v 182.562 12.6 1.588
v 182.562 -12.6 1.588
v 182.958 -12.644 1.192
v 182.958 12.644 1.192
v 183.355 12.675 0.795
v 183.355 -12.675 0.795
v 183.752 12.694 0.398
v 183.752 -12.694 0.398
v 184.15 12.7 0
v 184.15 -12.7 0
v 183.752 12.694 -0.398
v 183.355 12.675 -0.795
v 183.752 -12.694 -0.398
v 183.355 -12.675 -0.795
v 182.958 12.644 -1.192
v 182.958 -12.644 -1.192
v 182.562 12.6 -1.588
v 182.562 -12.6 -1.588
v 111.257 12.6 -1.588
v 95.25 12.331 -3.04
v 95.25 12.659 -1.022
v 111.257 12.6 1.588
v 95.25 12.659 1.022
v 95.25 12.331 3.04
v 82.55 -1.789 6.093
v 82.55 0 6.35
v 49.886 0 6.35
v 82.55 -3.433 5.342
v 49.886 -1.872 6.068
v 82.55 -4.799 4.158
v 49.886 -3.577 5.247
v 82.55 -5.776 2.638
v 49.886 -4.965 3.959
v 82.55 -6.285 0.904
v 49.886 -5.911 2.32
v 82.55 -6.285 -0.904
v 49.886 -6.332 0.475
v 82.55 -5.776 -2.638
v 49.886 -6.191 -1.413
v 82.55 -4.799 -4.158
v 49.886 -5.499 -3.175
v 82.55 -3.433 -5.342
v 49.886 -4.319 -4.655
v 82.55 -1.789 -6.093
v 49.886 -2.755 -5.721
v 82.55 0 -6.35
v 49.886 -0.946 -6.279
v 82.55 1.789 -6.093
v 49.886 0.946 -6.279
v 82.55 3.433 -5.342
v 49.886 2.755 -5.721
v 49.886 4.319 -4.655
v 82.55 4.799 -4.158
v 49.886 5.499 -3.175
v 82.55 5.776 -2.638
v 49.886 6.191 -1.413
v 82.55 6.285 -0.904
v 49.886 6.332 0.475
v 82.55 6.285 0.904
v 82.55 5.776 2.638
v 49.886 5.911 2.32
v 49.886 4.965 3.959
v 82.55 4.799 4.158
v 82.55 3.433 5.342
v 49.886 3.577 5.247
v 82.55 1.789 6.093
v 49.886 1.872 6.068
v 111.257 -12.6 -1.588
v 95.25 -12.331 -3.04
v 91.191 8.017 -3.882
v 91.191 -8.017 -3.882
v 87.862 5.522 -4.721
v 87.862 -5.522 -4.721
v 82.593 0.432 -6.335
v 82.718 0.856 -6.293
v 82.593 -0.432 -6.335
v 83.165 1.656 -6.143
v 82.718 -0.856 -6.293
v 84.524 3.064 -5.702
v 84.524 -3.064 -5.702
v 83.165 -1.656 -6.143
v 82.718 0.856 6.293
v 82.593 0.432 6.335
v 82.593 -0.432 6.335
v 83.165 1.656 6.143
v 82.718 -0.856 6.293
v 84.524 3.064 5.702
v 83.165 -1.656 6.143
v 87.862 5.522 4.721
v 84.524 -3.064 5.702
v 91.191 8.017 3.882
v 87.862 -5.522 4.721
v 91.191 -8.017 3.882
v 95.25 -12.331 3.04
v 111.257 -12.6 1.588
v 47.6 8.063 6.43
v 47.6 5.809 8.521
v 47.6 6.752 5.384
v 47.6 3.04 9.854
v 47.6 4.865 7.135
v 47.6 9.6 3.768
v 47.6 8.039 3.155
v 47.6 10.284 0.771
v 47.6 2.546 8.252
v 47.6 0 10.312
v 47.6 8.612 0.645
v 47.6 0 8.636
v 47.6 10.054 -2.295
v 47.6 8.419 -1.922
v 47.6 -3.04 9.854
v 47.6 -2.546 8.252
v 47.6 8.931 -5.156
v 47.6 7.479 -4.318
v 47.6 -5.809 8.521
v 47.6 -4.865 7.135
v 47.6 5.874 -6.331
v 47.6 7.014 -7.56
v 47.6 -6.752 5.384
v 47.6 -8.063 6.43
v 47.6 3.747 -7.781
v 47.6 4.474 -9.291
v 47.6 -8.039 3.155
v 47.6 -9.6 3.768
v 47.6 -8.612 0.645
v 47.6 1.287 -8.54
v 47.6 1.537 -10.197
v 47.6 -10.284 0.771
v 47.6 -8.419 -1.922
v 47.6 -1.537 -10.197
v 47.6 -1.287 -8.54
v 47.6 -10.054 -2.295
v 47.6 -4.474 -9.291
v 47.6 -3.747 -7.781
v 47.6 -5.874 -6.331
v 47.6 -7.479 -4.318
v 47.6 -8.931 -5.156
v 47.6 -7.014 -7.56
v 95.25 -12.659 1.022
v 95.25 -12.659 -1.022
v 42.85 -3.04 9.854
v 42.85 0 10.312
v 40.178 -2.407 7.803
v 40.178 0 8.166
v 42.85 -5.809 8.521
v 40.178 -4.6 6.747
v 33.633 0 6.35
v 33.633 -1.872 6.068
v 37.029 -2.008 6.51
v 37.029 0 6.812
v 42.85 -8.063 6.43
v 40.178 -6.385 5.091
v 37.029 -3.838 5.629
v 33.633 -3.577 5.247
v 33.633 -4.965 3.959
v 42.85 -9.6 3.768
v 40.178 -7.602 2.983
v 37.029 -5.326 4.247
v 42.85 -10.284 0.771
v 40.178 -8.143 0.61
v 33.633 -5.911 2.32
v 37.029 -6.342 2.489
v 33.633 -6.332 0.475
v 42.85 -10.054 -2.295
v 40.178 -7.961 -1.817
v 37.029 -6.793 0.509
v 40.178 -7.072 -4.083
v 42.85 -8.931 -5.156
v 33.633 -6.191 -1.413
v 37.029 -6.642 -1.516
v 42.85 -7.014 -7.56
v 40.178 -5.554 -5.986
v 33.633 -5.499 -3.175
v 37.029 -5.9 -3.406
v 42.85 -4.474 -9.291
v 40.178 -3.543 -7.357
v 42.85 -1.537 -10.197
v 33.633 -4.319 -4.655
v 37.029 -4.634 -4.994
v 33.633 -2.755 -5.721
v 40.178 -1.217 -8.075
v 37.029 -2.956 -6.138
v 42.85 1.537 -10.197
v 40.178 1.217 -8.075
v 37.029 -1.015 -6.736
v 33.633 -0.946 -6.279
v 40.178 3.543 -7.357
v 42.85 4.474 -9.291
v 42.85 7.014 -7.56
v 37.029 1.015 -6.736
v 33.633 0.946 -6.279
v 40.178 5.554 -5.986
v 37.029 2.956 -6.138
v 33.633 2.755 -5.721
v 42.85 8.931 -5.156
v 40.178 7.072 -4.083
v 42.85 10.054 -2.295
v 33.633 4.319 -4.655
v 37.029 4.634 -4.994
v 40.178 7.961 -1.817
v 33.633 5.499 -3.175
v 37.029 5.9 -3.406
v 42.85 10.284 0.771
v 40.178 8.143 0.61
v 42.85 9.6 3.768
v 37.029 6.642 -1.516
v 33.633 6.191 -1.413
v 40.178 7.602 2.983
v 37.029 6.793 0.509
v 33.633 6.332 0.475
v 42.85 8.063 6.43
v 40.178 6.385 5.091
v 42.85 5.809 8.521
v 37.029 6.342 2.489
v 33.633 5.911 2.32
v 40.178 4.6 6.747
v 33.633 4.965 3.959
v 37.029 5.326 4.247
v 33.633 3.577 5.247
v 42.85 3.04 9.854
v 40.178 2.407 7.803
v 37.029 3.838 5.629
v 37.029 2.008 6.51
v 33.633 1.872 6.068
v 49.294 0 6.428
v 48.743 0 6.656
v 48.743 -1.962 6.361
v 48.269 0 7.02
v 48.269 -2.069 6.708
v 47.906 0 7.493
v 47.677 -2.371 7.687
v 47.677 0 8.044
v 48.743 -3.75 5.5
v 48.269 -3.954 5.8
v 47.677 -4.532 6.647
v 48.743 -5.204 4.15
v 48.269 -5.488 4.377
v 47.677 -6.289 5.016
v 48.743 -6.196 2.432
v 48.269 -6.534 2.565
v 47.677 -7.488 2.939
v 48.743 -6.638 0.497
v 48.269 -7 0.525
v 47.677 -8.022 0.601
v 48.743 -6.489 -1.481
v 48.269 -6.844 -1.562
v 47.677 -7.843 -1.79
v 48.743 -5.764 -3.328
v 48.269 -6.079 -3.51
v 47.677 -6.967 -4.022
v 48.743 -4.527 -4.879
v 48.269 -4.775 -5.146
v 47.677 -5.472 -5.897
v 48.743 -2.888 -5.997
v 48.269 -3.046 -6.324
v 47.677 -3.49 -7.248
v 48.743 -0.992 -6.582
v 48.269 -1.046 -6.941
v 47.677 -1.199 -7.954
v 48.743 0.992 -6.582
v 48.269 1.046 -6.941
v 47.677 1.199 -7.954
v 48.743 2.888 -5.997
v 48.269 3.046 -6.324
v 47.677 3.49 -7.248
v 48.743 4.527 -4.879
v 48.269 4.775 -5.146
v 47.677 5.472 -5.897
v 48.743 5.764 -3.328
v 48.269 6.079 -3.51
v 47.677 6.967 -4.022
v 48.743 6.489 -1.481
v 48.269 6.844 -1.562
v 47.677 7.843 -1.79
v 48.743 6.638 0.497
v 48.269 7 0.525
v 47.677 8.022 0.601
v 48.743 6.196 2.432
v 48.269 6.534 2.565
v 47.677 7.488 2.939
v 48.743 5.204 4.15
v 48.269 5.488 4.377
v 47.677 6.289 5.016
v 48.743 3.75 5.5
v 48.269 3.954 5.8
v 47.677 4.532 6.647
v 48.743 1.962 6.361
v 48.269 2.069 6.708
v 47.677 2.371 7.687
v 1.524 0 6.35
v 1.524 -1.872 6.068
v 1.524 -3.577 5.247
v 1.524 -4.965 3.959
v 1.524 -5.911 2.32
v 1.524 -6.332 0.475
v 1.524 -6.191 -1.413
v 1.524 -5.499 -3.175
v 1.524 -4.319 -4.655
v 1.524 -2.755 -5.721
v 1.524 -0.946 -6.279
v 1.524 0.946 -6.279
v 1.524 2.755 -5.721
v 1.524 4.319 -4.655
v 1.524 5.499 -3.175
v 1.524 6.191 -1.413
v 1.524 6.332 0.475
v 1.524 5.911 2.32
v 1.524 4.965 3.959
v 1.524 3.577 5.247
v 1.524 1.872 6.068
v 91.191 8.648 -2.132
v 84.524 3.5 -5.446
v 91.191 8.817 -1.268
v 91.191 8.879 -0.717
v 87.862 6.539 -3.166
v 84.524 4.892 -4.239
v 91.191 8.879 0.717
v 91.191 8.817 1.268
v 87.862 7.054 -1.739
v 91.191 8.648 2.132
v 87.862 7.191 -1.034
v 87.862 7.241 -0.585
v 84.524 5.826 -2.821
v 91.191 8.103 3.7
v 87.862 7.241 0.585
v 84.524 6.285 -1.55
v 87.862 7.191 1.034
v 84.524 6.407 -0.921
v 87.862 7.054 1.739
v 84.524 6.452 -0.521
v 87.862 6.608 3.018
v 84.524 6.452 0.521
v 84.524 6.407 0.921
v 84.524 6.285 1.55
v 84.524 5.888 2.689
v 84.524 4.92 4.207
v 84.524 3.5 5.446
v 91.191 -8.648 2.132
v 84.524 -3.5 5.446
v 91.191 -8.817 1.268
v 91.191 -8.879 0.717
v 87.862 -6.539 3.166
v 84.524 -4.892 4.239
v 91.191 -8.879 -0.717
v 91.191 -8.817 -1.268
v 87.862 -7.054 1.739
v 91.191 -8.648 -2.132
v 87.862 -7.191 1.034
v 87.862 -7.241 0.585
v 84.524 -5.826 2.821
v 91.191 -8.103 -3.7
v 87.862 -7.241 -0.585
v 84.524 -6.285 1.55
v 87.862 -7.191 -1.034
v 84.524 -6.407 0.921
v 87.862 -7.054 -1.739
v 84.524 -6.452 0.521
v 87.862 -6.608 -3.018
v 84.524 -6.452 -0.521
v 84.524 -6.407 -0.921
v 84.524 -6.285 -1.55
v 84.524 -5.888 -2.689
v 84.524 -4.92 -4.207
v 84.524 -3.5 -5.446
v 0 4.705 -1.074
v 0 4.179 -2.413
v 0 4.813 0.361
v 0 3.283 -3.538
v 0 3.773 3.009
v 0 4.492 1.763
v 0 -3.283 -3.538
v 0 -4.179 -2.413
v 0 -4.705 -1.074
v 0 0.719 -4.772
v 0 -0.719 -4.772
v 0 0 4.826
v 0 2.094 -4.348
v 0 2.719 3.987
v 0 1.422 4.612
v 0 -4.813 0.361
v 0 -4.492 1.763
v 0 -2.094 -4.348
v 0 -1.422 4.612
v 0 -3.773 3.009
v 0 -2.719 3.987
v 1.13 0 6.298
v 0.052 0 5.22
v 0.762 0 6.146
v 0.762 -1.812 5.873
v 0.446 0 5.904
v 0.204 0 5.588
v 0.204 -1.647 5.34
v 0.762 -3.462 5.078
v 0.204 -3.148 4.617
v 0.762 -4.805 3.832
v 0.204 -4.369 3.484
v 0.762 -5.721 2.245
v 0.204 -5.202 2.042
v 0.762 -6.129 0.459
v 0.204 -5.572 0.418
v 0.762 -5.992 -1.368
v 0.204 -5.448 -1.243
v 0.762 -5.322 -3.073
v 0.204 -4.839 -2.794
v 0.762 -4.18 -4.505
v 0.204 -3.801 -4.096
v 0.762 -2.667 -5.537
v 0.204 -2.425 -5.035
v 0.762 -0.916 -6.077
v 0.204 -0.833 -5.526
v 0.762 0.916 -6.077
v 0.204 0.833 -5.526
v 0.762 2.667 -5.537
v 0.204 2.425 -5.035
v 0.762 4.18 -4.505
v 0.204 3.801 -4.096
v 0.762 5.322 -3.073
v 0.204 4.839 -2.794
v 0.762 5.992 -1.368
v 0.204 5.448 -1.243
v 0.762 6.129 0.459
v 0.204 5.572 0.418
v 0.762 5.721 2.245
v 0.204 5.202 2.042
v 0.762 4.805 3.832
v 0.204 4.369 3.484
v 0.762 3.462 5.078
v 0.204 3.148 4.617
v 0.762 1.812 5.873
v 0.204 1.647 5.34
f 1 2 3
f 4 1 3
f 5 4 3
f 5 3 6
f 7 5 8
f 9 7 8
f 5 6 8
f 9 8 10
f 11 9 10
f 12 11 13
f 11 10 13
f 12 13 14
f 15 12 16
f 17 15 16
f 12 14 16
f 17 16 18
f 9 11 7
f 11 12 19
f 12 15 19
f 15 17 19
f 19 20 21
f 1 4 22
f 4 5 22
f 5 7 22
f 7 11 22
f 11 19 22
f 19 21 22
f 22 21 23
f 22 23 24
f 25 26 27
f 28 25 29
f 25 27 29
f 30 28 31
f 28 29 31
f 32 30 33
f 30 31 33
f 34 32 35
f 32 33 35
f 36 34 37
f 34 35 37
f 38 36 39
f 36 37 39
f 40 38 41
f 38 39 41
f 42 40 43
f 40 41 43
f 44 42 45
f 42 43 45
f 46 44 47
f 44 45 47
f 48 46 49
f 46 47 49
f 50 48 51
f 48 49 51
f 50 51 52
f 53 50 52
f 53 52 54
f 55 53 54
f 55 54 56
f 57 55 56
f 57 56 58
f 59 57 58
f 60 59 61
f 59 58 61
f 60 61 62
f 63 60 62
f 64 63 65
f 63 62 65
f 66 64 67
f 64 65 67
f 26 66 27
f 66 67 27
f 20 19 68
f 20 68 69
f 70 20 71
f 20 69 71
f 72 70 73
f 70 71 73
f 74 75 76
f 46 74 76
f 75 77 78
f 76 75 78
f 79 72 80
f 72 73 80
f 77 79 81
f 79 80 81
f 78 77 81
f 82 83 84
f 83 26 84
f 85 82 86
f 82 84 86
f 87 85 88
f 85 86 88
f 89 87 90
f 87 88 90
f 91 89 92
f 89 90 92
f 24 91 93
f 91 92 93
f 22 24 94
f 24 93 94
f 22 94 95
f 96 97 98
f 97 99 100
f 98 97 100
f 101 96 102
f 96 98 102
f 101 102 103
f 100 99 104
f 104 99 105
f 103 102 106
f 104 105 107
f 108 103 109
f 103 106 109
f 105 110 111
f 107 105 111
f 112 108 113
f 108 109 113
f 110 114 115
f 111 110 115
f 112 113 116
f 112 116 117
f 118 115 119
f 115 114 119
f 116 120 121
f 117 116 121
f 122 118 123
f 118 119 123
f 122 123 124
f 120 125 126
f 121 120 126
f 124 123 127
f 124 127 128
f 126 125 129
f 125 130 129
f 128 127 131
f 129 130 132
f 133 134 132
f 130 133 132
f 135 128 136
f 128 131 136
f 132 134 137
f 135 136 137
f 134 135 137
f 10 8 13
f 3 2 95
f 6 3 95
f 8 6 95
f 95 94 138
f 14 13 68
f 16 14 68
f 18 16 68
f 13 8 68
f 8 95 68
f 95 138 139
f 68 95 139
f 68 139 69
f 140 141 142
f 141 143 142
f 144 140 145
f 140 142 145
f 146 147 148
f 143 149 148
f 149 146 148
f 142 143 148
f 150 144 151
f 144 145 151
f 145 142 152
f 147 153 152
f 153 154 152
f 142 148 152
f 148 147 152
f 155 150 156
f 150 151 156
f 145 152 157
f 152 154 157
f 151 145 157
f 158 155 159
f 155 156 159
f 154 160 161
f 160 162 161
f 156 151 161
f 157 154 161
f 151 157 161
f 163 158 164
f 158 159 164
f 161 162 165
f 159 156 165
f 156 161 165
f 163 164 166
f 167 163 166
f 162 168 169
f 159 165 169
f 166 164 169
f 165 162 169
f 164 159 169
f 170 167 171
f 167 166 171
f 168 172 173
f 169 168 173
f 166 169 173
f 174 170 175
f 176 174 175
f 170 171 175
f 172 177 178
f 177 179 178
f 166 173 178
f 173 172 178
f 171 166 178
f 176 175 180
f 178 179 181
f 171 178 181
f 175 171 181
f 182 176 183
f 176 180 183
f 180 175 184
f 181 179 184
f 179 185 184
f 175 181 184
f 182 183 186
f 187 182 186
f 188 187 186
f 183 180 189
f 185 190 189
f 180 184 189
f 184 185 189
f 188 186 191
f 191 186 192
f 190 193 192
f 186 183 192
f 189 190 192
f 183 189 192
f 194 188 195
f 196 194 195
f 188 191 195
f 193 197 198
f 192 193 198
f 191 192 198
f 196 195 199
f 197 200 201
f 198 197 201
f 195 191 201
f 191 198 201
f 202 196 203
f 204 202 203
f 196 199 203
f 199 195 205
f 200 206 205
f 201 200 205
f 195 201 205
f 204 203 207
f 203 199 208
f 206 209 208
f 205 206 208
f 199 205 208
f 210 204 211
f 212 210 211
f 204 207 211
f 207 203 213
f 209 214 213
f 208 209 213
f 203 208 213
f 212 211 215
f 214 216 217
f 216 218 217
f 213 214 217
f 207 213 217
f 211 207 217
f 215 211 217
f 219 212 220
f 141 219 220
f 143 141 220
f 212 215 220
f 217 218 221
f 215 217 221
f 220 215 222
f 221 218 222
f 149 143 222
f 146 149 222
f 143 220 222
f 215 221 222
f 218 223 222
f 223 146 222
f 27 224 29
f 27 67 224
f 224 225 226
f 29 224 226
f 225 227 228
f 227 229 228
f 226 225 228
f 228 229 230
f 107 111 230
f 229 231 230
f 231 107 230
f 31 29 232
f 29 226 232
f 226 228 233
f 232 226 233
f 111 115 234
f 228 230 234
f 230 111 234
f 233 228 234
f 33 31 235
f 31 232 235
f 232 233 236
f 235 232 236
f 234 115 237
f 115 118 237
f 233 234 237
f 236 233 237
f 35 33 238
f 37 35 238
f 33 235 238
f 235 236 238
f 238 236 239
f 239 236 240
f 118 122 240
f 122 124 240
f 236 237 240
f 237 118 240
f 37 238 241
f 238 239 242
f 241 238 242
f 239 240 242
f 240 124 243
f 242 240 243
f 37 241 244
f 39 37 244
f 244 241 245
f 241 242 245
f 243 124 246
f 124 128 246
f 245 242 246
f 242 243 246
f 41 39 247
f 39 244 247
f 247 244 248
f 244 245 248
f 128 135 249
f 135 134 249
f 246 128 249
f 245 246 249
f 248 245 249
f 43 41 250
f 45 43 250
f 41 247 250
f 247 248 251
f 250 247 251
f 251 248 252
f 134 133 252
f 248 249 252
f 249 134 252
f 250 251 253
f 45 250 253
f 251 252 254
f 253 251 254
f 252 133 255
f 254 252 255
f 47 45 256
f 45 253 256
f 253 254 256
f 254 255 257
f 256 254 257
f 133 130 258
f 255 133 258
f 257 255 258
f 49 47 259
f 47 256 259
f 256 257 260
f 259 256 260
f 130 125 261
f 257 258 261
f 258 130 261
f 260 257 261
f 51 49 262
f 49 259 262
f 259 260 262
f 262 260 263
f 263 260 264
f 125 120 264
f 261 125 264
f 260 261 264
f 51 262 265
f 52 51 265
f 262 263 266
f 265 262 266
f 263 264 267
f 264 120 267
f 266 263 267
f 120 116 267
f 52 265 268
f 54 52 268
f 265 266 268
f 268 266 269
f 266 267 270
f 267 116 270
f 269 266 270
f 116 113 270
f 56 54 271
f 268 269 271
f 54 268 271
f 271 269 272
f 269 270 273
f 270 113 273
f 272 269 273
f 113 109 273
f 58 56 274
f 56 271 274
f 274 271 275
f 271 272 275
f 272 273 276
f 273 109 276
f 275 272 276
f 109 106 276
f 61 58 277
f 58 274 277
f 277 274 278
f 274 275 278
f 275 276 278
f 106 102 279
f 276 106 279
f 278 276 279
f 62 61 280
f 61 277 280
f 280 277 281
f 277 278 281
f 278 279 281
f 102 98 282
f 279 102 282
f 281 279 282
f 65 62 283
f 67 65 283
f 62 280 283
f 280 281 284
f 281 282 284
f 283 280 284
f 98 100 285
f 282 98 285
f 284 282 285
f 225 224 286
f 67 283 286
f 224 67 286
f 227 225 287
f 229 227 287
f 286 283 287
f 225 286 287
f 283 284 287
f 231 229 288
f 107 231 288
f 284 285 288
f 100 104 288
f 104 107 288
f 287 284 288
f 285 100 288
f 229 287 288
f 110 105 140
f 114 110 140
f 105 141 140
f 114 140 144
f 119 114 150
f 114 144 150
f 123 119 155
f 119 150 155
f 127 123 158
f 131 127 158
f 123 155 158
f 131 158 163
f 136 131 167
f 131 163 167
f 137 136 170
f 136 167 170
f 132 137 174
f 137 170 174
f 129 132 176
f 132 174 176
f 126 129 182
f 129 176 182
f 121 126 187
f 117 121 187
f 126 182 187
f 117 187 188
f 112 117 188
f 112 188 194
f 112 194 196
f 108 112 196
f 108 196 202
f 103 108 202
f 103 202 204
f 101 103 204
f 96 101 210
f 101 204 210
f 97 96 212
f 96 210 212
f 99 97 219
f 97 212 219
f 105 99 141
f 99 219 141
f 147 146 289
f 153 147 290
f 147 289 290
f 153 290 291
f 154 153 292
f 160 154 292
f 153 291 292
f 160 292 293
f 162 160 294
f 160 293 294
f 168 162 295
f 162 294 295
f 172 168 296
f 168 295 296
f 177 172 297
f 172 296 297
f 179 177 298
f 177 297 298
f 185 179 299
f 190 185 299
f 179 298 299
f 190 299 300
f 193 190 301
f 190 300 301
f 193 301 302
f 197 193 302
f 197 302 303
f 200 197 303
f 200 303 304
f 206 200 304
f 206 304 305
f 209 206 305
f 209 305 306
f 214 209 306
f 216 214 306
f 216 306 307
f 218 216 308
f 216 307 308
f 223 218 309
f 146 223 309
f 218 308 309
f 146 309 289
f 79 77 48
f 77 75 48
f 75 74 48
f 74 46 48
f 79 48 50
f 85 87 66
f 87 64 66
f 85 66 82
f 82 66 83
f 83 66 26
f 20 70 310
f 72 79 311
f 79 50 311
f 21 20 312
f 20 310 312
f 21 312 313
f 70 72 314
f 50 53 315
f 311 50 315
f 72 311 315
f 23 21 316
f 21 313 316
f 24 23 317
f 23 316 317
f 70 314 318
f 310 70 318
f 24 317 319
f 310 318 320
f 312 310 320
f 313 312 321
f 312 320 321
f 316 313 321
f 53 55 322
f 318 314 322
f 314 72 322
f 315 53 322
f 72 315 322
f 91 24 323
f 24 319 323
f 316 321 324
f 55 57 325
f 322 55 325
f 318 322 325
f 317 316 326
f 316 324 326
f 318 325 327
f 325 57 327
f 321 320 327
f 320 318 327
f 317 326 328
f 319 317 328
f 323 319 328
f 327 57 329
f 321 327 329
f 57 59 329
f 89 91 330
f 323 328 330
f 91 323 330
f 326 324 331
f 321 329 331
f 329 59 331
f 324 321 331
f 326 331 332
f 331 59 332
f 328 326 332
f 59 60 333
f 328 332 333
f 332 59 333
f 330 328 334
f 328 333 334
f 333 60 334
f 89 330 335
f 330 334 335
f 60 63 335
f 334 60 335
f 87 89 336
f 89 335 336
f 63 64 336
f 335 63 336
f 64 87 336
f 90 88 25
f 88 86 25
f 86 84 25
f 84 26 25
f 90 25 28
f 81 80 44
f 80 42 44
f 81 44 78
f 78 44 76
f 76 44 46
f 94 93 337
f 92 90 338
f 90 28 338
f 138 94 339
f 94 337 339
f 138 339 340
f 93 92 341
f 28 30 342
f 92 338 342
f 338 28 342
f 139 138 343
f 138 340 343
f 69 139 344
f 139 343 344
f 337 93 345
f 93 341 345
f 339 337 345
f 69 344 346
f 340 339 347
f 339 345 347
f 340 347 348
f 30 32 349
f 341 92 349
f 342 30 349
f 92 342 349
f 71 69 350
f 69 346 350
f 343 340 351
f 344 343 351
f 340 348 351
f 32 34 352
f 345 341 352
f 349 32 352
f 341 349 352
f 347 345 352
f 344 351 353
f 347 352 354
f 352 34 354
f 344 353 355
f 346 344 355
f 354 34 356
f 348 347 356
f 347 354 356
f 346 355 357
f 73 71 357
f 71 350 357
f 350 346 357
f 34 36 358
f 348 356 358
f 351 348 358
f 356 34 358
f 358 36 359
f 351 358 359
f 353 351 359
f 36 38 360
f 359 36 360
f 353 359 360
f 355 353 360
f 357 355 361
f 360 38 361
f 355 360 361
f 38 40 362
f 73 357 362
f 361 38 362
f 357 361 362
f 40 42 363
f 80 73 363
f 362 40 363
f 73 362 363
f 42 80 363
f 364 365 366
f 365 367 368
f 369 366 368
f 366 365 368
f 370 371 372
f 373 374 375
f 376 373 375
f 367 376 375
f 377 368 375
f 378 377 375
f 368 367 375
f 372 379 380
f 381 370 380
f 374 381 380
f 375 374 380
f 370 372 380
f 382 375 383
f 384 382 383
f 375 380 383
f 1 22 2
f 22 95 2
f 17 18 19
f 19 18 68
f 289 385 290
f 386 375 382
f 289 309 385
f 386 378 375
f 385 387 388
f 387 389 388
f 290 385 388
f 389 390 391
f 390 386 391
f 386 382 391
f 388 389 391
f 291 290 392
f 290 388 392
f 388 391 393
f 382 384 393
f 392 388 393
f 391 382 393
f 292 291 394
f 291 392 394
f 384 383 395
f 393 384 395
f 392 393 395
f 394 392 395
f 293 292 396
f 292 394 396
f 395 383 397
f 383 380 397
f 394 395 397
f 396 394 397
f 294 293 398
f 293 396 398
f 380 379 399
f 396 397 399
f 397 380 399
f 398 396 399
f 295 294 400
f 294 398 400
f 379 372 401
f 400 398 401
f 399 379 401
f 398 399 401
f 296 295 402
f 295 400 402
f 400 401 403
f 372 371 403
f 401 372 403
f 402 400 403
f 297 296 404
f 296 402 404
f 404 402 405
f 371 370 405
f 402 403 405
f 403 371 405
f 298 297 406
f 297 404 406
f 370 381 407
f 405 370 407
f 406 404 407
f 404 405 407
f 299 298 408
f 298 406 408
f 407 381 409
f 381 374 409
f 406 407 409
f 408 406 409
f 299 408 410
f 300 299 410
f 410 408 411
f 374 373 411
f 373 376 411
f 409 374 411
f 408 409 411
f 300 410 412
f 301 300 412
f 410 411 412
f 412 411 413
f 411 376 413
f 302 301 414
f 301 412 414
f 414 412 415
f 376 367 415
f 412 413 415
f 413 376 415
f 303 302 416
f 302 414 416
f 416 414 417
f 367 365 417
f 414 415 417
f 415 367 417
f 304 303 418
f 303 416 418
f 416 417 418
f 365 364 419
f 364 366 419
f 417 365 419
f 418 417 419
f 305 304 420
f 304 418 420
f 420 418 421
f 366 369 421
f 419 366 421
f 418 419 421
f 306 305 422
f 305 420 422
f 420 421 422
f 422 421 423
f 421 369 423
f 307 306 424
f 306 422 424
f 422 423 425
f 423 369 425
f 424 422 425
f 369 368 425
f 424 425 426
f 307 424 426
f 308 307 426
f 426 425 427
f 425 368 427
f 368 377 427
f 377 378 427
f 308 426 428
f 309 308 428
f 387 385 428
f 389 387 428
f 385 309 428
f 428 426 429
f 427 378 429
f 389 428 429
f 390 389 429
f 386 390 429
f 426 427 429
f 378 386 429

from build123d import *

# Parameters (mm, degrees)
F3_DEPTH = 25.4
F4_DEPTH = 25.4
F6_DEPTH = 25.4
F7_DEPTH = 25.4


with BuildPart() as f1:
    # F0 (on Front) → F1 (revolve)
    with BuildSketch(Plane.XZ):
        with BuildLine():
            Line((0, 4.826), (0, 0))
            Line((0, 0), (184.15, 0))
            Line((184.15, 0), (184.15, 12.7))
            Line((184.15, 12.7), (95.25, 12.7))
            ThreePointArc((95.25, 12.7), (89.649516, 8.025968), (82.55, 6.35))
            Line((82.55, 6.35), (49.8856, 6.35))
            ThreePointArc((49.8856, 6.35), (48.269154, 7.019554), (47.5996, 8.636))
            Line((47.5996, 8.636), (47.5996, 10.3124))
            Line((47.5996, 10.3124), (42.8498, 10.3124))
            ThreePointArc((42.8498, 10.3124), (38.649372, 7.382577), (33.633274, 6.35))
            Line((33.633274, 6.35), (1.524, 6.35))
            ThreePointArc((1.524, 6.35), (0.446369, 5.903631), (0, 4.826))
        make_face()
    revolve(axis=Axis((92.075, 0, 0), (1, 0, 0)))

    # F2 (on Front) → F3 (cut)
    with BuildSketch(Plane.XZ):
        with BuildLine():
            Line((299.925119, 1.5875), (179.814342, 147.083428))
            ThreePointArc((179.814342, 147.083428), (30.837499, 128.380982), (111.256987, 1.5875))
            Line((111.256987, 1.5875), (299.925119, 1.5875))
        make_face()
        with BuildLine():
            Line((299.925119, -1.5875), (111.256987, -1.5875))
            ThreePointArc((111.256987, -1.5875), (30.837499, -128.380982), (179.814342, -147.083428))
            Line((179.814342, -147.083428), (299.925119, -1.5875))
        make_face()
    extrude(amount=-F3_DEPTH, mode=Mode.SUBTRACT)

    # F2 (on Front) → F4 (cut)
    with BuildSketch(Plane.XZ):
        with BuildLine():
            Line((299.925119, 1.5875), (179.814342, 147.083428))
            ThreePointArc((179.814342, 147.083428), (30.837499, 128.380982), (111.256987, 1.5875))
            Line((111.256987, 1.5875), (299.925119, 1.5875))
        make_face()
        with BuildLine():
            Line((299.925119, -1.5875), (111.256987, -1.5875))
            ThreePointArc((111.256987, -1.5875), (30.837499, -128.380982), (179.814342, -147.083428))
            Line((179.814342, -147.083428), (299.925119, -1.5875))
        make_face()
    extrude(amount=F4_DEPTH, mode=Mode.SUBTRACT)

    # F5 (on Front) → F6 (cut)
    with BuildSketch(Plane.XZ):
        Polygon((184.15, -3.802141), (184.15, 0), (180.61569, -3.53431), align=None)
        Polygon((180.61569, 3.53431), (184.15, 0), (184.15, 3.802141), align=None)
    extrude(amount=-F6_DEPTH, mode=Mode.SUBTRACT)

    # F5 (on Front) → F7 (cut)
    with BuildSketch(Plane.XZ):
        Polygon((180.61569, 3.53431), (184.15, 0), (184.15, 3.802141), align=None)
        Polygon((184.15, -3.802141), (184.15, 0), (180.61569, -3.53431), align=None)
    extrude(amount=F7_DEPTH, mode=Mode.SUBTRACT)


solid = f1.part
